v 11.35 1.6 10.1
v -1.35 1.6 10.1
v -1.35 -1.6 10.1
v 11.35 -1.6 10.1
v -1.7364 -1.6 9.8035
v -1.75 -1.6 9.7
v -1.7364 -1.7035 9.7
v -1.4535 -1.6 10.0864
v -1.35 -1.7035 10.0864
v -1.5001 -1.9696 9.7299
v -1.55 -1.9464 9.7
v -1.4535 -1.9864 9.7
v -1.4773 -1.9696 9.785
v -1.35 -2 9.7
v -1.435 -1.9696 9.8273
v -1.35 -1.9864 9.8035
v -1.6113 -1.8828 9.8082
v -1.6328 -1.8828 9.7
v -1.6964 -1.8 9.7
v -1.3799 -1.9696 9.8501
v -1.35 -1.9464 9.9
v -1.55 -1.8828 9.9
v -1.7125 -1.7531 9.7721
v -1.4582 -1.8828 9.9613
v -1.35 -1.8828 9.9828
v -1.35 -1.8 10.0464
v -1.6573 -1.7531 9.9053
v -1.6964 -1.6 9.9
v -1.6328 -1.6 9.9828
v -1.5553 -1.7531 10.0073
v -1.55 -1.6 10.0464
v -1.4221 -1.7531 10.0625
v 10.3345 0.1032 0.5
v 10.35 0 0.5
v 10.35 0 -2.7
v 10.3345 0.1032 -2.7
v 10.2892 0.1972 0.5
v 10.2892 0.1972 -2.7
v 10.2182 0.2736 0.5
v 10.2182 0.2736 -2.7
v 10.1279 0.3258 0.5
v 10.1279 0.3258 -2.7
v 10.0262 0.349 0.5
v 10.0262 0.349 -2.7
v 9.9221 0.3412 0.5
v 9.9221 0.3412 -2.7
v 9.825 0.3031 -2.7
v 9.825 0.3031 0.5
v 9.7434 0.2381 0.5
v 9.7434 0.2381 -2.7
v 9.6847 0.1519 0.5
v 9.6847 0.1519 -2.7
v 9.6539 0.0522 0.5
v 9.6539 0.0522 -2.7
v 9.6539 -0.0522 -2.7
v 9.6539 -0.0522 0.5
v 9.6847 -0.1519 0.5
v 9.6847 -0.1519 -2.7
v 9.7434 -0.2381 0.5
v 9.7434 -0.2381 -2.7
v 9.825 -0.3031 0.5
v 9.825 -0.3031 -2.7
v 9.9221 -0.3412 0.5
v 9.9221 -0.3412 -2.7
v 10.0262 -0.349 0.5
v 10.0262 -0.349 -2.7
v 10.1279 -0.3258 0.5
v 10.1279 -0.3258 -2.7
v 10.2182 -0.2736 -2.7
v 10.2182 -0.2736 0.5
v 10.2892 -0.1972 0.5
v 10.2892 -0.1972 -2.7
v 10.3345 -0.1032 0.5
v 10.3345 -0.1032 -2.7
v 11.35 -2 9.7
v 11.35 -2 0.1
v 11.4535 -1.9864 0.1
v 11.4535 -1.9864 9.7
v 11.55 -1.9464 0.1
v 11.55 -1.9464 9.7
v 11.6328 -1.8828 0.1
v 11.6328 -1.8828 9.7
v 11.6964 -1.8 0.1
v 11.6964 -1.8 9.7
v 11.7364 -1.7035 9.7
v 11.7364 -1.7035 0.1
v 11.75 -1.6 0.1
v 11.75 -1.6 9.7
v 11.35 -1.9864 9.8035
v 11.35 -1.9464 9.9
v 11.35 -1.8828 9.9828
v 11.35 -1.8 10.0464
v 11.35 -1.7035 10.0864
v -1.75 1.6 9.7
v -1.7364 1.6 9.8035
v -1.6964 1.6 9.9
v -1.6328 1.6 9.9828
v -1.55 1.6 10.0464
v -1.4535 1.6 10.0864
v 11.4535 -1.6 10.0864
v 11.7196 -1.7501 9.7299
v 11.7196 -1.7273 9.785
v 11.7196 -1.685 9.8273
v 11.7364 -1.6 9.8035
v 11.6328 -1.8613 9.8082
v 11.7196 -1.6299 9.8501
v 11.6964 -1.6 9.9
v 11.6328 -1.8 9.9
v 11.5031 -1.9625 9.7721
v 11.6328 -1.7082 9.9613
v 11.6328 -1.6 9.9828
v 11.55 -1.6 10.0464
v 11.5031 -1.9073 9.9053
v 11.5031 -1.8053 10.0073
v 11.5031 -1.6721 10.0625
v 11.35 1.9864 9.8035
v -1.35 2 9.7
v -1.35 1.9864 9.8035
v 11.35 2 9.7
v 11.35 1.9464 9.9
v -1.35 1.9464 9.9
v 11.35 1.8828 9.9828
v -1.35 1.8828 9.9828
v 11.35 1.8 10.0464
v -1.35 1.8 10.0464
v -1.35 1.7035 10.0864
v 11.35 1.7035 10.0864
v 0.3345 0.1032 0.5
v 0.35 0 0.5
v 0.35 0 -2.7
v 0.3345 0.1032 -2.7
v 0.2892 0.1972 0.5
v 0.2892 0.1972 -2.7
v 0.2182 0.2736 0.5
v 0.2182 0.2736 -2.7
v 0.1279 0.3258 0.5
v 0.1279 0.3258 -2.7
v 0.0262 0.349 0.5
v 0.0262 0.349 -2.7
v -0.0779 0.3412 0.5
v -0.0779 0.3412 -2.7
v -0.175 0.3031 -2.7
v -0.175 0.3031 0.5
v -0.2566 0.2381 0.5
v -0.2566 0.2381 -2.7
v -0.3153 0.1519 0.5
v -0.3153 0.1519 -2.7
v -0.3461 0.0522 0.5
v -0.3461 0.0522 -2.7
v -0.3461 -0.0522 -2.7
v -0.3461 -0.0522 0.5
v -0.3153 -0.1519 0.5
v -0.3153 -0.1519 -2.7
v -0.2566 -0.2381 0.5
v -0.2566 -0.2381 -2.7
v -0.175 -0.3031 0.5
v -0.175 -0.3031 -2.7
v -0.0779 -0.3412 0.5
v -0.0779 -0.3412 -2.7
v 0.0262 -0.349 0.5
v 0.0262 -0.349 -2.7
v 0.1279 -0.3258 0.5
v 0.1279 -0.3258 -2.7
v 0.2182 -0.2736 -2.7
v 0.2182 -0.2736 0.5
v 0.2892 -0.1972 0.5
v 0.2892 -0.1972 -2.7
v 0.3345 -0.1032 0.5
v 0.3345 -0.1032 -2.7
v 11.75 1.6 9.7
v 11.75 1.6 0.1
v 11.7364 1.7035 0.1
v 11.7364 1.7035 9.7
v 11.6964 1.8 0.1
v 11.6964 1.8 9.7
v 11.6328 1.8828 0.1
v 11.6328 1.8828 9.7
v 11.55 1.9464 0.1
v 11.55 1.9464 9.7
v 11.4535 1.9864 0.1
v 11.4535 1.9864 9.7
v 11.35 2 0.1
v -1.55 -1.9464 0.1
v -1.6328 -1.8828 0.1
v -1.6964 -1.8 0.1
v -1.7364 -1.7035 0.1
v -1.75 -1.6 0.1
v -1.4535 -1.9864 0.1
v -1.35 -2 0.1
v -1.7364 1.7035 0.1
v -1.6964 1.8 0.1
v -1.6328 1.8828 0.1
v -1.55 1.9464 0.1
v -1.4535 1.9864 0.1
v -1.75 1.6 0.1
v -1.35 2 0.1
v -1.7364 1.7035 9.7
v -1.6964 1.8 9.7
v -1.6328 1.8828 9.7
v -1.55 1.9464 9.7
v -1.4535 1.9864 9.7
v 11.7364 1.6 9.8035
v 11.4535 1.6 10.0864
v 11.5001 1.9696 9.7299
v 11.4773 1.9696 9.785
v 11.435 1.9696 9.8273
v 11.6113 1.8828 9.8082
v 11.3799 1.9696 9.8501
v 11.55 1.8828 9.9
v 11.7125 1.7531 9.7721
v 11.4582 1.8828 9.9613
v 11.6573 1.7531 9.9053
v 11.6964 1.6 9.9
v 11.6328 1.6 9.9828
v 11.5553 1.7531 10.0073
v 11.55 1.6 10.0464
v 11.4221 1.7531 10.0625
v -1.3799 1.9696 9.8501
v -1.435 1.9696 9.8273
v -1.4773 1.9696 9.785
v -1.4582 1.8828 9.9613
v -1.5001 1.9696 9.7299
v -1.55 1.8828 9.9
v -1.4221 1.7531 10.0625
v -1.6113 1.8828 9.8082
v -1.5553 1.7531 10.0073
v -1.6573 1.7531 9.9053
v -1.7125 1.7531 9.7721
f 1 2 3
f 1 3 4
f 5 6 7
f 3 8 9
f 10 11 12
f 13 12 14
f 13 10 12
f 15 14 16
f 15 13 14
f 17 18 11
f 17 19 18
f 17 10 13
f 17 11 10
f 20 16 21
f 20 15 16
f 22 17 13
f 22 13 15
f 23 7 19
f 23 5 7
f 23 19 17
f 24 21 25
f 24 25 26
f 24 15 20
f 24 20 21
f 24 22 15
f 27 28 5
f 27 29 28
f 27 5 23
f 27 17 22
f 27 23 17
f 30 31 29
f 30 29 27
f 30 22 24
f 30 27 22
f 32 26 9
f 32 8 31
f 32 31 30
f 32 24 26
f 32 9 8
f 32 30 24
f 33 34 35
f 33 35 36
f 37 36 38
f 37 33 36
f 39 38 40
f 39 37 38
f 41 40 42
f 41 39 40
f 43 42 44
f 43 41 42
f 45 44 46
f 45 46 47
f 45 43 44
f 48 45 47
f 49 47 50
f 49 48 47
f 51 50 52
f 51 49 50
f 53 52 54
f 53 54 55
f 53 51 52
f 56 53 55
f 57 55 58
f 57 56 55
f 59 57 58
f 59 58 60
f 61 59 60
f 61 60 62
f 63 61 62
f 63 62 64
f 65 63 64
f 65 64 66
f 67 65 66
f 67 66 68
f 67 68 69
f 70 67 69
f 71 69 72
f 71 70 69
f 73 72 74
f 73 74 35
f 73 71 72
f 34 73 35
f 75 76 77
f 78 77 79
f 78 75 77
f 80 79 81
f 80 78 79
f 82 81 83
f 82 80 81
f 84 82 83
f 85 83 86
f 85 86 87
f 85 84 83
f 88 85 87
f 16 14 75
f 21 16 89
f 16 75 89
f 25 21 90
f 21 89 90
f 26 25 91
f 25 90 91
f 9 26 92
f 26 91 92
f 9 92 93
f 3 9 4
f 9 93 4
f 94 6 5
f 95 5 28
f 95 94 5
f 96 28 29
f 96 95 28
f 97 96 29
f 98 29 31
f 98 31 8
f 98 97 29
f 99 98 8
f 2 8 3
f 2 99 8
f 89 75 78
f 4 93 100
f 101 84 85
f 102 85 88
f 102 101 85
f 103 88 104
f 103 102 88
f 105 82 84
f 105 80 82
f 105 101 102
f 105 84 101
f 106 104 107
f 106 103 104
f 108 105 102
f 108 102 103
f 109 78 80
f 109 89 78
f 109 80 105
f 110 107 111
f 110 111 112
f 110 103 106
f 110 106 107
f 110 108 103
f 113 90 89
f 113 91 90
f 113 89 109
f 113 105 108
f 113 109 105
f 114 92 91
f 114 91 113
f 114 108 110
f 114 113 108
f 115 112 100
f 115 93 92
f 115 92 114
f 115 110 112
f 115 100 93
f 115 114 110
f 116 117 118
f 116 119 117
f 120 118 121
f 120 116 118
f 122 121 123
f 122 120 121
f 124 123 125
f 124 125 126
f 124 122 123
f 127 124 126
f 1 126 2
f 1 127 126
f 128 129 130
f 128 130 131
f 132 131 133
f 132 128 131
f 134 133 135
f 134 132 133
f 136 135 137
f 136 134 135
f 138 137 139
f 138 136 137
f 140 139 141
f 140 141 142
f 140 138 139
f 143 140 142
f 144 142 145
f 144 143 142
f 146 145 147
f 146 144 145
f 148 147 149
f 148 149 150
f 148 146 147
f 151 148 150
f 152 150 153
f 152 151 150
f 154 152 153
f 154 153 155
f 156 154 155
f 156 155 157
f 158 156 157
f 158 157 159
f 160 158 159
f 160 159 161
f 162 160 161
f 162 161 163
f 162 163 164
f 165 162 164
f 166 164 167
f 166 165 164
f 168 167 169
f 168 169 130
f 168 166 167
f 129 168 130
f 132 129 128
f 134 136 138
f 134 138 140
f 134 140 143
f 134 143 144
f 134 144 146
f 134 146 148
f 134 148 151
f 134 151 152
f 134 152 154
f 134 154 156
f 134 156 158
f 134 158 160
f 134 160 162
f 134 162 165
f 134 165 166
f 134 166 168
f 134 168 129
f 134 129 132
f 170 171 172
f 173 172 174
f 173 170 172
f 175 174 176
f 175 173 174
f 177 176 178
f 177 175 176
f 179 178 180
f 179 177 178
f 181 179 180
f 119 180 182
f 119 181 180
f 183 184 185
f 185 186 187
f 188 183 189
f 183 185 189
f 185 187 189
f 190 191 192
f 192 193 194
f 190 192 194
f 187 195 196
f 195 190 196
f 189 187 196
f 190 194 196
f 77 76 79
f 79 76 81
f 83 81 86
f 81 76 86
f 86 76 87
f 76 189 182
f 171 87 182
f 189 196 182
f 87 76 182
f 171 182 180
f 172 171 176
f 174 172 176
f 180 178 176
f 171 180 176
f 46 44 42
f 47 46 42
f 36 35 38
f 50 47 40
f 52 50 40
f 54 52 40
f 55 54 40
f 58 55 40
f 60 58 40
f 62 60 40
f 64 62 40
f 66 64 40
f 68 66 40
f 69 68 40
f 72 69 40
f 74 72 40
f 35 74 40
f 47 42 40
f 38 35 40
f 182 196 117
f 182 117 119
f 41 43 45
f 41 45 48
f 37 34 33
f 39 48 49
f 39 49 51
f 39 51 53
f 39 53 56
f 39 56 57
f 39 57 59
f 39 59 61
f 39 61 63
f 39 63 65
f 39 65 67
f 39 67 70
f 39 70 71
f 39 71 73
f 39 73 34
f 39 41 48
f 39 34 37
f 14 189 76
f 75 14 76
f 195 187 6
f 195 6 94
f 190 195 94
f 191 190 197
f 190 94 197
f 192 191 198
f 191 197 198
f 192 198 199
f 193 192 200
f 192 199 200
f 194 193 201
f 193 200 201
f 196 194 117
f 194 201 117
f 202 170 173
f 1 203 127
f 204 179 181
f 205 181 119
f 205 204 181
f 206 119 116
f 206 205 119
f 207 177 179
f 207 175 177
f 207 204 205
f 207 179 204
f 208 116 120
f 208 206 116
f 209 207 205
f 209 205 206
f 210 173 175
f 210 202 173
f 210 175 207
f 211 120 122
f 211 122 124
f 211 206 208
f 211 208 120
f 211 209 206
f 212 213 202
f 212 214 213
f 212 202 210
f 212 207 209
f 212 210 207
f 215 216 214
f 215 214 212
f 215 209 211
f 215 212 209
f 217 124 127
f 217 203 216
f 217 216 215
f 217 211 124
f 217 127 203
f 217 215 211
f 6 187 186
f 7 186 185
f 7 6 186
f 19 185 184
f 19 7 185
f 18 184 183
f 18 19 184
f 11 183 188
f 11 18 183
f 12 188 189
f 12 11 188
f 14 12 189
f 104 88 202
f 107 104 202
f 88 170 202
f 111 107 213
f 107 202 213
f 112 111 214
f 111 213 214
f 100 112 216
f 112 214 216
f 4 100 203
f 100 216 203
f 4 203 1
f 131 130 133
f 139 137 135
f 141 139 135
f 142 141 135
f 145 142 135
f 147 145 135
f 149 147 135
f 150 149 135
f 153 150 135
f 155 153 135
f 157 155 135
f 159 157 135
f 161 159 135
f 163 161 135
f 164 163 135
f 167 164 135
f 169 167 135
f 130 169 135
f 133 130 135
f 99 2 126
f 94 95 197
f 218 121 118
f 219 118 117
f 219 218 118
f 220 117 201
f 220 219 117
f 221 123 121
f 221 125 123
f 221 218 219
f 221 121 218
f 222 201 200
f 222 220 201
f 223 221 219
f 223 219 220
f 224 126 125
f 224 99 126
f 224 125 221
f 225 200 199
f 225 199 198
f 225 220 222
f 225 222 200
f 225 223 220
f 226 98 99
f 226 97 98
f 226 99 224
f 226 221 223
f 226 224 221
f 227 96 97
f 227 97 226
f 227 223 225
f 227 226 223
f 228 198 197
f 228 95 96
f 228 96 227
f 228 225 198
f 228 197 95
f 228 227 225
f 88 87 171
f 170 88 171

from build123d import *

# Parameters (mm, degrees)
SKETCH_W     = 13.5
SKETCH_H     = 4
PAD_DEPTH    = 10
FILLET_R     = 0.4
SKETCH001_R  = 0.35
PAD001_DEPTH = 3.2


with BuildPart() as fillet_body:
    # Sketch → Pad (new body)
    with BuildSketch(Plane.XY.offset(0.1)):
        with Locations((5, 0)):
            Rectangle(SKETCH_W, SKETCH_H)
    extrude(amount=PAD_DEPTH)

    # Fillet
    fillet_edges = [fillet_body.edges().sort_by_distance(p)[0] for p in [
        (-1.75, 0, 10.1),
        (-1.75, -2, 5.1),
        (5, -2, 10.1),
        (11.75, -2, 5.1),
        (11.75, 0, 10.1),
        (11.75, 2, 5.1),
        (5, 2, 10.1),
        (-1.75, 2, 5.1),
    ]]
    fillet(fillet_edges, radius=FILLET_R)


with BuildPart() as pad001:
    # Sketch001 → Pad001 (new body)
    with BuildSketch(Plane.XY.offset(0.5)):
        Circle(SKETCH001_R)
        with Locations((10, 0)):
            Circle(SKETCH001_R)
    extrude(amount=-PAD001_DEPTH)


solid = Compound([fillet_body.part, pad001.part])
